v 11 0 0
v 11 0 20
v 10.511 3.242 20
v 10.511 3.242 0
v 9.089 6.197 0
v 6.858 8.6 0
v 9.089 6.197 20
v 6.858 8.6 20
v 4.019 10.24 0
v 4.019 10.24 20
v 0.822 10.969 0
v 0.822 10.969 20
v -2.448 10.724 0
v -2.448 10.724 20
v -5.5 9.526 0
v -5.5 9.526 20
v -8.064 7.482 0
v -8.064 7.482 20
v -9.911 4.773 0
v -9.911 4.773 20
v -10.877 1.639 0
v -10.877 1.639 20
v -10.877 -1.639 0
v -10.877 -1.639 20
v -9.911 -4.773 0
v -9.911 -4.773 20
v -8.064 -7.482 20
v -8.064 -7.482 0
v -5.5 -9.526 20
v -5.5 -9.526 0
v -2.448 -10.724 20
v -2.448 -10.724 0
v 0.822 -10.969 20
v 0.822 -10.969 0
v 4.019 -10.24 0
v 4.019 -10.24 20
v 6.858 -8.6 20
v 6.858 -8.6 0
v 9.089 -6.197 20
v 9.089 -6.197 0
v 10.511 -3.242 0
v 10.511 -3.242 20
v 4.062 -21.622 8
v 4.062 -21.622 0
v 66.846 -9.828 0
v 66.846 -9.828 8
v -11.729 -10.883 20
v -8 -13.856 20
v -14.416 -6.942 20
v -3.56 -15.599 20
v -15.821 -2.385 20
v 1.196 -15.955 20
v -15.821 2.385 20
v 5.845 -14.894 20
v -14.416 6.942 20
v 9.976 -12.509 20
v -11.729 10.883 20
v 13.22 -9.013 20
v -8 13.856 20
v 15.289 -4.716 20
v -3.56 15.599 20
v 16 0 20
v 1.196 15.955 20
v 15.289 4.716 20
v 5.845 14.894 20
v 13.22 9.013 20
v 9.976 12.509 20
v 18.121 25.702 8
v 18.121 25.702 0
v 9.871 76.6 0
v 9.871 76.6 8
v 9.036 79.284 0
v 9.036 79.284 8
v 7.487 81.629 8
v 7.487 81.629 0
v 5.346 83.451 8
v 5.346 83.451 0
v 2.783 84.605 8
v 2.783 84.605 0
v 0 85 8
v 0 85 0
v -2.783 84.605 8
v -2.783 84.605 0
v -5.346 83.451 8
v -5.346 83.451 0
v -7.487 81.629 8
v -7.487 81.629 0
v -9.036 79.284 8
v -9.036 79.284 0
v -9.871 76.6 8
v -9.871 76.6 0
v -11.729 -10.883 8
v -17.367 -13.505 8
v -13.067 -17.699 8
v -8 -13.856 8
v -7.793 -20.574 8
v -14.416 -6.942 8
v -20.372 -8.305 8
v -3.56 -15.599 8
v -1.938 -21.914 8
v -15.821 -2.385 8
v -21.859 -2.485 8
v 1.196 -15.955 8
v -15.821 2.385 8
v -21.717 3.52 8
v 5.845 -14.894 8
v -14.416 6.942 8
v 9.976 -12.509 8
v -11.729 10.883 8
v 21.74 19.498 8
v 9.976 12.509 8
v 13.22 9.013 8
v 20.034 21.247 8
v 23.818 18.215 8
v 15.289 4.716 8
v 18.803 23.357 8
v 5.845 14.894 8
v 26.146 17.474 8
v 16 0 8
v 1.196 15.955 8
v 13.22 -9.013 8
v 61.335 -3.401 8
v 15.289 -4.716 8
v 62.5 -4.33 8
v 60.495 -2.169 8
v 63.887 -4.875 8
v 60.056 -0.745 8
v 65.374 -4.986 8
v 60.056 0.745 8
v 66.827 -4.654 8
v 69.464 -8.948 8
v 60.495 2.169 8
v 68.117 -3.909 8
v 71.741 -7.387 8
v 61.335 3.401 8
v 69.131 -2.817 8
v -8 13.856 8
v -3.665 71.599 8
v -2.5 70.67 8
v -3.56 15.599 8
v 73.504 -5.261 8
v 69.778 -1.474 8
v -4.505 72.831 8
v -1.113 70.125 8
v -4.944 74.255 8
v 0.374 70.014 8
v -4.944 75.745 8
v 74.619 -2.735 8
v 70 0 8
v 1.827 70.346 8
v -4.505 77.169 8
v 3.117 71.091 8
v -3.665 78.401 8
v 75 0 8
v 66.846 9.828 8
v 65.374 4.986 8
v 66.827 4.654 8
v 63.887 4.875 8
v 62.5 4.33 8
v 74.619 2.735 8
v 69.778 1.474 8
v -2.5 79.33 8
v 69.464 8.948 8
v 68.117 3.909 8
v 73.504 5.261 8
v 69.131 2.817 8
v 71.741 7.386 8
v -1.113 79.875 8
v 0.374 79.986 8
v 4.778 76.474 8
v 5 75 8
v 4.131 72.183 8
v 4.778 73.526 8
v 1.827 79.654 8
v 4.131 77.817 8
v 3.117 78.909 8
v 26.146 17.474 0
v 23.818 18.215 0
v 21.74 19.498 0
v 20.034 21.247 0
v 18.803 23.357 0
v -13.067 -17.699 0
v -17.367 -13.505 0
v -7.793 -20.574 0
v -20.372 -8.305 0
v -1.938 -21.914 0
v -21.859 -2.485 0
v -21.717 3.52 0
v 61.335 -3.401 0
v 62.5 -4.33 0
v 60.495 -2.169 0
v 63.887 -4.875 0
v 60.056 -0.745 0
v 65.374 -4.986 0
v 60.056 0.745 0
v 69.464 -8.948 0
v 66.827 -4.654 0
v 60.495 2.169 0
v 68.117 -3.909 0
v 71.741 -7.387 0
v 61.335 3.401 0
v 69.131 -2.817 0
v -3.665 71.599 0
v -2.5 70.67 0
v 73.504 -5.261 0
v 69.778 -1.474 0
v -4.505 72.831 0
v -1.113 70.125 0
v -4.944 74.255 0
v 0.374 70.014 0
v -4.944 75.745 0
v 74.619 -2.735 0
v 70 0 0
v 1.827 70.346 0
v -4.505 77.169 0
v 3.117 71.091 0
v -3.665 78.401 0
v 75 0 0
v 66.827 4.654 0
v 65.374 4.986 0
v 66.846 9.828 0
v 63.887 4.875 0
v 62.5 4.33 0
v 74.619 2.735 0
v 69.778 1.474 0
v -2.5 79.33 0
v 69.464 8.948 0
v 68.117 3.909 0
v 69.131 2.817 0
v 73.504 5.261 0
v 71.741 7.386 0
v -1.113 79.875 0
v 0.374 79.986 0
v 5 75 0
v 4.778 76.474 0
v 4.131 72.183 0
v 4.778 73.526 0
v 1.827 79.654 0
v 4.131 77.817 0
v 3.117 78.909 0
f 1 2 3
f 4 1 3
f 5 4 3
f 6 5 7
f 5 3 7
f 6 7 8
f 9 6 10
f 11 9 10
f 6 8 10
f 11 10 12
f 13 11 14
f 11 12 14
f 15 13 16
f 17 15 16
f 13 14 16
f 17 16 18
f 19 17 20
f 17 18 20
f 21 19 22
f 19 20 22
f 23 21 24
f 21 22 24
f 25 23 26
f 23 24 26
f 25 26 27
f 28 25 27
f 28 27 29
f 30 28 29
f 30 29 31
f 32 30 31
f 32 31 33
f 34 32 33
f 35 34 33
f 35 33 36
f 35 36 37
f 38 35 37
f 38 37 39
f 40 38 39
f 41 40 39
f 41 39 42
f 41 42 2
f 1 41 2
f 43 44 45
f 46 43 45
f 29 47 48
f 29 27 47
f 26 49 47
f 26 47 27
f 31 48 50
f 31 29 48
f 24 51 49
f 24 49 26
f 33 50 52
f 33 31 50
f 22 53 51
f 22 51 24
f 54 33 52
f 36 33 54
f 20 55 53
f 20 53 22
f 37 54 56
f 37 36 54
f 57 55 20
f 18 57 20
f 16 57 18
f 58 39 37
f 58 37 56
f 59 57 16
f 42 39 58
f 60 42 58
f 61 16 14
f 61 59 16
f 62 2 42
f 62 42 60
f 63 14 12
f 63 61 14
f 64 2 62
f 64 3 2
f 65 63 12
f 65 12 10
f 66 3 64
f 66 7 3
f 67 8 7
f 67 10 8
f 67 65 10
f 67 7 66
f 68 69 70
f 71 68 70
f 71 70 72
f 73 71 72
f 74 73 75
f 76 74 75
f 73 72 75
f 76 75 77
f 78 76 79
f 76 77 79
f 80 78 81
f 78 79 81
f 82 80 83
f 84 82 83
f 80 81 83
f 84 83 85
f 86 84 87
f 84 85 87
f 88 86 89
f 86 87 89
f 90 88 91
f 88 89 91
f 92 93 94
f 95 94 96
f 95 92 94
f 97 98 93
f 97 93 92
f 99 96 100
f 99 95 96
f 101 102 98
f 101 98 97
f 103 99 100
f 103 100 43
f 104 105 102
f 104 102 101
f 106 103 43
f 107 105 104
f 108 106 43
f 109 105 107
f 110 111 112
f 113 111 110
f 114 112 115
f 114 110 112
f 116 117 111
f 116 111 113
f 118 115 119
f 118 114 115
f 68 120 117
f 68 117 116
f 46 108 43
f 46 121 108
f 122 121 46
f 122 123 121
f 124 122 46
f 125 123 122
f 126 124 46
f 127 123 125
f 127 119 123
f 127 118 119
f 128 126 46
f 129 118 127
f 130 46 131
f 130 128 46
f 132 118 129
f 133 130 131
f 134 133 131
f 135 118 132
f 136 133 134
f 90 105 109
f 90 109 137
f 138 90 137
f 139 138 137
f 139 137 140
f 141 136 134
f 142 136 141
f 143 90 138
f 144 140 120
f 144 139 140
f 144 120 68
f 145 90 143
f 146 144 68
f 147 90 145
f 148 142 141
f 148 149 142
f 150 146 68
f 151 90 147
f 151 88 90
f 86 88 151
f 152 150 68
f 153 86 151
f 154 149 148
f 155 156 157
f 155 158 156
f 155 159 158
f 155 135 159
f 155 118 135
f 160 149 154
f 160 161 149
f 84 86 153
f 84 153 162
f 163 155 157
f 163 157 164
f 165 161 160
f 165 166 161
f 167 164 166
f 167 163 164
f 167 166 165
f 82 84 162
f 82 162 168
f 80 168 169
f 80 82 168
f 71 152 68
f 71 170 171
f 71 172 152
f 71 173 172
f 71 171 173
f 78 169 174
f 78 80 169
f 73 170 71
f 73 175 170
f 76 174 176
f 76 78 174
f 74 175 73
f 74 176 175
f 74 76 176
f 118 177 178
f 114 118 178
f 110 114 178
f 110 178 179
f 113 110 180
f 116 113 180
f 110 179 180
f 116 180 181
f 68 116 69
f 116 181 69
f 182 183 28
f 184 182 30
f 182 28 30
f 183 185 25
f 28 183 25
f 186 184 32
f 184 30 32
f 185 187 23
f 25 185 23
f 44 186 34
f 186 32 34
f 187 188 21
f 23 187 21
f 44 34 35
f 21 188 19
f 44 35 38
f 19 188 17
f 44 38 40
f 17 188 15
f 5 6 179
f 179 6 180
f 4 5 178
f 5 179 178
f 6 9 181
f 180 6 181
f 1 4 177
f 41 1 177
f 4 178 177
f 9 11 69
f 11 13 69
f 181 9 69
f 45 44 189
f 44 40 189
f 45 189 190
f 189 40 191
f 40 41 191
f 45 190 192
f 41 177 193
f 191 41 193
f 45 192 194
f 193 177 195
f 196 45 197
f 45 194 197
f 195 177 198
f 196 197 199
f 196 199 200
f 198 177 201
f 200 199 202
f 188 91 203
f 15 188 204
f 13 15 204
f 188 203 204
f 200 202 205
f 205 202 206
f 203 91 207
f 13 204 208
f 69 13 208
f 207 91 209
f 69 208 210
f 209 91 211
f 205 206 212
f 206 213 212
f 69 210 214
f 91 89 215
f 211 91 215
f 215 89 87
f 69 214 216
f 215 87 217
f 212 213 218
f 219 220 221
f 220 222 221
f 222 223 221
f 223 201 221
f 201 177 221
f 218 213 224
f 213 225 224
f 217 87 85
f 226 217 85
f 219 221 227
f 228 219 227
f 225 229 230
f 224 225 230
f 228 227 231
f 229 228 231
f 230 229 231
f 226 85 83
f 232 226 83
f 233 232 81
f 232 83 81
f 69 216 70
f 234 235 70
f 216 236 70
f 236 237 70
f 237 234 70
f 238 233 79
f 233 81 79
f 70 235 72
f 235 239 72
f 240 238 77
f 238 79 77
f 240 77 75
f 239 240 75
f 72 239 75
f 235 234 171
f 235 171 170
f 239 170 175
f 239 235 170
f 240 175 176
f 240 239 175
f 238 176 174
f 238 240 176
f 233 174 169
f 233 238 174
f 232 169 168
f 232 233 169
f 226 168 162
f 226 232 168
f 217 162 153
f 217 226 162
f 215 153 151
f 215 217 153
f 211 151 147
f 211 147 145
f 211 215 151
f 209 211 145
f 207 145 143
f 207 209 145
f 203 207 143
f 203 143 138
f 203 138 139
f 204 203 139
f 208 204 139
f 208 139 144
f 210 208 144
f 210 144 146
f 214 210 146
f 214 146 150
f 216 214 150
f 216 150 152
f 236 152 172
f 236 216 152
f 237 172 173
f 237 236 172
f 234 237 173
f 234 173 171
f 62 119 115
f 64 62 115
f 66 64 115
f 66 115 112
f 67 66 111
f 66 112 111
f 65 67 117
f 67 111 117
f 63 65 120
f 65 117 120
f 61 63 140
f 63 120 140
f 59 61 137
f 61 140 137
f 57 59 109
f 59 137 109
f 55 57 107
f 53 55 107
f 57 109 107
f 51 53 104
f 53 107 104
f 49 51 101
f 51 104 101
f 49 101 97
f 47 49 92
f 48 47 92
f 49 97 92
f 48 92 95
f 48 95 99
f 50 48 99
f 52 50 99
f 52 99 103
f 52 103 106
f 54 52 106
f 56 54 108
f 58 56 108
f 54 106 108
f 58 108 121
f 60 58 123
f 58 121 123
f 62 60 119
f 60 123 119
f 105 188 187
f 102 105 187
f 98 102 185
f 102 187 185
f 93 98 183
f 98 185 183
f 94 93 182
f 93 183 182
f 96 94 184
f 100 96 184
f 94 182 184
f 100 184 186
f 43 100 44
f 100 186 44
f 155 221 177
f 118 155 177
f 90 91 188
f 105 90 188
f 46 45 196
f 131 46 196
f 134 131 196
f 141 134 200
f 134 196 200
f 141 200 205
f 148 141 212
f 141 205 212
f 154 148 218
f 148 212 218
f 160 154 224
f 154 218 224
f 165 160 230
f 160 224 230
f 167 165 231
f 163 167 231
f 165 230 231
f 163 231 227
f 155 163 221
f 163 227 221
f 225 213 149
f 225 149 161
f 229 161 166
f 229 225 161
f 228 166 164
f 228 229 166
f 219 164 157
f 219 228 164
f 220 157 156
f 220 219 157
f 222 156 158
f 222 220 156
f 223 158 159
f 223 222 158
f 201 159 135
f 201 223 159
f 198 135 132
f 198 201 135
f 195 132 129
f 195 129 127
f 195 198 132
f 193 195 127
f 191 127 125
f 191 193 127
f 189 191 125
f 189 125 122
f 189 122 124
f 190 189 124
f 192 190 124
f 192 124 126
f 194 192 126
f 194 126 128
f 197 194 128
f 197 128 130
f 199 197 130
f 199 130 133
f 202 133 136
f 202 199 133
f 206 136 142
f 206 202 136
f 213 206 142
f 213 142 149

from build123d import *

# Parameters (mm, degrees)
SKETCH1_R           = 5
BOSS_EXTRUDE1_DEPTH = 8
SKETCH4_R           = 16
BOSS_EXTRUDE3_DEPTH = 12
SKETCH5_R           = 11
CUT_EXTRUDE3_DEPTH  = 116.108644332


with BuildPart() as part:
    # Sketch1 → Boss-Extrude1 (new body)
    with BuildSketch(Plane.XY):
        with BuildLine():
            Line((-9.871170143, 76.6), (-21.716574315, 3.52))
            ThreePointArc((-21.716574315, 3.52), (-15.360764468, -15.749505229), (4.061538462, -21.62183862))
            Line((4.061538462, -21.62183862), (66.846153846, -9.828108464))
            ThreePointArc((66.846153846, -9.828108464), (74.999999999, -0.000112634), (66.846375241, 9.828066874))
            Line((66.846375241, 9.828066874), (26.145857586, 17.474375048))
            ThreePointArc((26.145857586, 17.474375048), (20.833288171, 20.320356887), (18.121062683, 25.702441922))
            Line((18.121062683, 25.702441922), (9.871170143, 76.6))
            ThreePointArc((9.871170143, 76.6), (0, 85), (-9.871170143, 76.6))
        make_face()
        with Locations((0, 75)):
            Circle(SKETCH1_R, mode=Mode.SUBTRACT)
        with Locations((65, 0)):
            Circle(SKETCH1_R, mode=Mode.SUBTRACT)
    extrude(amount=BOSS_EXTRUDE1_DEPTH)

    # Sketch4 → Boss-Extrude3 (add)
    with BuildSketch(Plane.XY.offset(8)):
        Circle(SKETCH4_R)
    extrude(amount=BOSS_EXTRUDE3_DEPTH)

    # Sketch5 → Cut-Extrude3 (cut, through all)
    with BuildSketch(Plane.XY.offset(20)):
        Circle(SKETCH5_R)
    extrude(amount=-CUT_EXTRUDE3_DEPTH, mode=Mode.SUBTRACT)


solid = part.part
